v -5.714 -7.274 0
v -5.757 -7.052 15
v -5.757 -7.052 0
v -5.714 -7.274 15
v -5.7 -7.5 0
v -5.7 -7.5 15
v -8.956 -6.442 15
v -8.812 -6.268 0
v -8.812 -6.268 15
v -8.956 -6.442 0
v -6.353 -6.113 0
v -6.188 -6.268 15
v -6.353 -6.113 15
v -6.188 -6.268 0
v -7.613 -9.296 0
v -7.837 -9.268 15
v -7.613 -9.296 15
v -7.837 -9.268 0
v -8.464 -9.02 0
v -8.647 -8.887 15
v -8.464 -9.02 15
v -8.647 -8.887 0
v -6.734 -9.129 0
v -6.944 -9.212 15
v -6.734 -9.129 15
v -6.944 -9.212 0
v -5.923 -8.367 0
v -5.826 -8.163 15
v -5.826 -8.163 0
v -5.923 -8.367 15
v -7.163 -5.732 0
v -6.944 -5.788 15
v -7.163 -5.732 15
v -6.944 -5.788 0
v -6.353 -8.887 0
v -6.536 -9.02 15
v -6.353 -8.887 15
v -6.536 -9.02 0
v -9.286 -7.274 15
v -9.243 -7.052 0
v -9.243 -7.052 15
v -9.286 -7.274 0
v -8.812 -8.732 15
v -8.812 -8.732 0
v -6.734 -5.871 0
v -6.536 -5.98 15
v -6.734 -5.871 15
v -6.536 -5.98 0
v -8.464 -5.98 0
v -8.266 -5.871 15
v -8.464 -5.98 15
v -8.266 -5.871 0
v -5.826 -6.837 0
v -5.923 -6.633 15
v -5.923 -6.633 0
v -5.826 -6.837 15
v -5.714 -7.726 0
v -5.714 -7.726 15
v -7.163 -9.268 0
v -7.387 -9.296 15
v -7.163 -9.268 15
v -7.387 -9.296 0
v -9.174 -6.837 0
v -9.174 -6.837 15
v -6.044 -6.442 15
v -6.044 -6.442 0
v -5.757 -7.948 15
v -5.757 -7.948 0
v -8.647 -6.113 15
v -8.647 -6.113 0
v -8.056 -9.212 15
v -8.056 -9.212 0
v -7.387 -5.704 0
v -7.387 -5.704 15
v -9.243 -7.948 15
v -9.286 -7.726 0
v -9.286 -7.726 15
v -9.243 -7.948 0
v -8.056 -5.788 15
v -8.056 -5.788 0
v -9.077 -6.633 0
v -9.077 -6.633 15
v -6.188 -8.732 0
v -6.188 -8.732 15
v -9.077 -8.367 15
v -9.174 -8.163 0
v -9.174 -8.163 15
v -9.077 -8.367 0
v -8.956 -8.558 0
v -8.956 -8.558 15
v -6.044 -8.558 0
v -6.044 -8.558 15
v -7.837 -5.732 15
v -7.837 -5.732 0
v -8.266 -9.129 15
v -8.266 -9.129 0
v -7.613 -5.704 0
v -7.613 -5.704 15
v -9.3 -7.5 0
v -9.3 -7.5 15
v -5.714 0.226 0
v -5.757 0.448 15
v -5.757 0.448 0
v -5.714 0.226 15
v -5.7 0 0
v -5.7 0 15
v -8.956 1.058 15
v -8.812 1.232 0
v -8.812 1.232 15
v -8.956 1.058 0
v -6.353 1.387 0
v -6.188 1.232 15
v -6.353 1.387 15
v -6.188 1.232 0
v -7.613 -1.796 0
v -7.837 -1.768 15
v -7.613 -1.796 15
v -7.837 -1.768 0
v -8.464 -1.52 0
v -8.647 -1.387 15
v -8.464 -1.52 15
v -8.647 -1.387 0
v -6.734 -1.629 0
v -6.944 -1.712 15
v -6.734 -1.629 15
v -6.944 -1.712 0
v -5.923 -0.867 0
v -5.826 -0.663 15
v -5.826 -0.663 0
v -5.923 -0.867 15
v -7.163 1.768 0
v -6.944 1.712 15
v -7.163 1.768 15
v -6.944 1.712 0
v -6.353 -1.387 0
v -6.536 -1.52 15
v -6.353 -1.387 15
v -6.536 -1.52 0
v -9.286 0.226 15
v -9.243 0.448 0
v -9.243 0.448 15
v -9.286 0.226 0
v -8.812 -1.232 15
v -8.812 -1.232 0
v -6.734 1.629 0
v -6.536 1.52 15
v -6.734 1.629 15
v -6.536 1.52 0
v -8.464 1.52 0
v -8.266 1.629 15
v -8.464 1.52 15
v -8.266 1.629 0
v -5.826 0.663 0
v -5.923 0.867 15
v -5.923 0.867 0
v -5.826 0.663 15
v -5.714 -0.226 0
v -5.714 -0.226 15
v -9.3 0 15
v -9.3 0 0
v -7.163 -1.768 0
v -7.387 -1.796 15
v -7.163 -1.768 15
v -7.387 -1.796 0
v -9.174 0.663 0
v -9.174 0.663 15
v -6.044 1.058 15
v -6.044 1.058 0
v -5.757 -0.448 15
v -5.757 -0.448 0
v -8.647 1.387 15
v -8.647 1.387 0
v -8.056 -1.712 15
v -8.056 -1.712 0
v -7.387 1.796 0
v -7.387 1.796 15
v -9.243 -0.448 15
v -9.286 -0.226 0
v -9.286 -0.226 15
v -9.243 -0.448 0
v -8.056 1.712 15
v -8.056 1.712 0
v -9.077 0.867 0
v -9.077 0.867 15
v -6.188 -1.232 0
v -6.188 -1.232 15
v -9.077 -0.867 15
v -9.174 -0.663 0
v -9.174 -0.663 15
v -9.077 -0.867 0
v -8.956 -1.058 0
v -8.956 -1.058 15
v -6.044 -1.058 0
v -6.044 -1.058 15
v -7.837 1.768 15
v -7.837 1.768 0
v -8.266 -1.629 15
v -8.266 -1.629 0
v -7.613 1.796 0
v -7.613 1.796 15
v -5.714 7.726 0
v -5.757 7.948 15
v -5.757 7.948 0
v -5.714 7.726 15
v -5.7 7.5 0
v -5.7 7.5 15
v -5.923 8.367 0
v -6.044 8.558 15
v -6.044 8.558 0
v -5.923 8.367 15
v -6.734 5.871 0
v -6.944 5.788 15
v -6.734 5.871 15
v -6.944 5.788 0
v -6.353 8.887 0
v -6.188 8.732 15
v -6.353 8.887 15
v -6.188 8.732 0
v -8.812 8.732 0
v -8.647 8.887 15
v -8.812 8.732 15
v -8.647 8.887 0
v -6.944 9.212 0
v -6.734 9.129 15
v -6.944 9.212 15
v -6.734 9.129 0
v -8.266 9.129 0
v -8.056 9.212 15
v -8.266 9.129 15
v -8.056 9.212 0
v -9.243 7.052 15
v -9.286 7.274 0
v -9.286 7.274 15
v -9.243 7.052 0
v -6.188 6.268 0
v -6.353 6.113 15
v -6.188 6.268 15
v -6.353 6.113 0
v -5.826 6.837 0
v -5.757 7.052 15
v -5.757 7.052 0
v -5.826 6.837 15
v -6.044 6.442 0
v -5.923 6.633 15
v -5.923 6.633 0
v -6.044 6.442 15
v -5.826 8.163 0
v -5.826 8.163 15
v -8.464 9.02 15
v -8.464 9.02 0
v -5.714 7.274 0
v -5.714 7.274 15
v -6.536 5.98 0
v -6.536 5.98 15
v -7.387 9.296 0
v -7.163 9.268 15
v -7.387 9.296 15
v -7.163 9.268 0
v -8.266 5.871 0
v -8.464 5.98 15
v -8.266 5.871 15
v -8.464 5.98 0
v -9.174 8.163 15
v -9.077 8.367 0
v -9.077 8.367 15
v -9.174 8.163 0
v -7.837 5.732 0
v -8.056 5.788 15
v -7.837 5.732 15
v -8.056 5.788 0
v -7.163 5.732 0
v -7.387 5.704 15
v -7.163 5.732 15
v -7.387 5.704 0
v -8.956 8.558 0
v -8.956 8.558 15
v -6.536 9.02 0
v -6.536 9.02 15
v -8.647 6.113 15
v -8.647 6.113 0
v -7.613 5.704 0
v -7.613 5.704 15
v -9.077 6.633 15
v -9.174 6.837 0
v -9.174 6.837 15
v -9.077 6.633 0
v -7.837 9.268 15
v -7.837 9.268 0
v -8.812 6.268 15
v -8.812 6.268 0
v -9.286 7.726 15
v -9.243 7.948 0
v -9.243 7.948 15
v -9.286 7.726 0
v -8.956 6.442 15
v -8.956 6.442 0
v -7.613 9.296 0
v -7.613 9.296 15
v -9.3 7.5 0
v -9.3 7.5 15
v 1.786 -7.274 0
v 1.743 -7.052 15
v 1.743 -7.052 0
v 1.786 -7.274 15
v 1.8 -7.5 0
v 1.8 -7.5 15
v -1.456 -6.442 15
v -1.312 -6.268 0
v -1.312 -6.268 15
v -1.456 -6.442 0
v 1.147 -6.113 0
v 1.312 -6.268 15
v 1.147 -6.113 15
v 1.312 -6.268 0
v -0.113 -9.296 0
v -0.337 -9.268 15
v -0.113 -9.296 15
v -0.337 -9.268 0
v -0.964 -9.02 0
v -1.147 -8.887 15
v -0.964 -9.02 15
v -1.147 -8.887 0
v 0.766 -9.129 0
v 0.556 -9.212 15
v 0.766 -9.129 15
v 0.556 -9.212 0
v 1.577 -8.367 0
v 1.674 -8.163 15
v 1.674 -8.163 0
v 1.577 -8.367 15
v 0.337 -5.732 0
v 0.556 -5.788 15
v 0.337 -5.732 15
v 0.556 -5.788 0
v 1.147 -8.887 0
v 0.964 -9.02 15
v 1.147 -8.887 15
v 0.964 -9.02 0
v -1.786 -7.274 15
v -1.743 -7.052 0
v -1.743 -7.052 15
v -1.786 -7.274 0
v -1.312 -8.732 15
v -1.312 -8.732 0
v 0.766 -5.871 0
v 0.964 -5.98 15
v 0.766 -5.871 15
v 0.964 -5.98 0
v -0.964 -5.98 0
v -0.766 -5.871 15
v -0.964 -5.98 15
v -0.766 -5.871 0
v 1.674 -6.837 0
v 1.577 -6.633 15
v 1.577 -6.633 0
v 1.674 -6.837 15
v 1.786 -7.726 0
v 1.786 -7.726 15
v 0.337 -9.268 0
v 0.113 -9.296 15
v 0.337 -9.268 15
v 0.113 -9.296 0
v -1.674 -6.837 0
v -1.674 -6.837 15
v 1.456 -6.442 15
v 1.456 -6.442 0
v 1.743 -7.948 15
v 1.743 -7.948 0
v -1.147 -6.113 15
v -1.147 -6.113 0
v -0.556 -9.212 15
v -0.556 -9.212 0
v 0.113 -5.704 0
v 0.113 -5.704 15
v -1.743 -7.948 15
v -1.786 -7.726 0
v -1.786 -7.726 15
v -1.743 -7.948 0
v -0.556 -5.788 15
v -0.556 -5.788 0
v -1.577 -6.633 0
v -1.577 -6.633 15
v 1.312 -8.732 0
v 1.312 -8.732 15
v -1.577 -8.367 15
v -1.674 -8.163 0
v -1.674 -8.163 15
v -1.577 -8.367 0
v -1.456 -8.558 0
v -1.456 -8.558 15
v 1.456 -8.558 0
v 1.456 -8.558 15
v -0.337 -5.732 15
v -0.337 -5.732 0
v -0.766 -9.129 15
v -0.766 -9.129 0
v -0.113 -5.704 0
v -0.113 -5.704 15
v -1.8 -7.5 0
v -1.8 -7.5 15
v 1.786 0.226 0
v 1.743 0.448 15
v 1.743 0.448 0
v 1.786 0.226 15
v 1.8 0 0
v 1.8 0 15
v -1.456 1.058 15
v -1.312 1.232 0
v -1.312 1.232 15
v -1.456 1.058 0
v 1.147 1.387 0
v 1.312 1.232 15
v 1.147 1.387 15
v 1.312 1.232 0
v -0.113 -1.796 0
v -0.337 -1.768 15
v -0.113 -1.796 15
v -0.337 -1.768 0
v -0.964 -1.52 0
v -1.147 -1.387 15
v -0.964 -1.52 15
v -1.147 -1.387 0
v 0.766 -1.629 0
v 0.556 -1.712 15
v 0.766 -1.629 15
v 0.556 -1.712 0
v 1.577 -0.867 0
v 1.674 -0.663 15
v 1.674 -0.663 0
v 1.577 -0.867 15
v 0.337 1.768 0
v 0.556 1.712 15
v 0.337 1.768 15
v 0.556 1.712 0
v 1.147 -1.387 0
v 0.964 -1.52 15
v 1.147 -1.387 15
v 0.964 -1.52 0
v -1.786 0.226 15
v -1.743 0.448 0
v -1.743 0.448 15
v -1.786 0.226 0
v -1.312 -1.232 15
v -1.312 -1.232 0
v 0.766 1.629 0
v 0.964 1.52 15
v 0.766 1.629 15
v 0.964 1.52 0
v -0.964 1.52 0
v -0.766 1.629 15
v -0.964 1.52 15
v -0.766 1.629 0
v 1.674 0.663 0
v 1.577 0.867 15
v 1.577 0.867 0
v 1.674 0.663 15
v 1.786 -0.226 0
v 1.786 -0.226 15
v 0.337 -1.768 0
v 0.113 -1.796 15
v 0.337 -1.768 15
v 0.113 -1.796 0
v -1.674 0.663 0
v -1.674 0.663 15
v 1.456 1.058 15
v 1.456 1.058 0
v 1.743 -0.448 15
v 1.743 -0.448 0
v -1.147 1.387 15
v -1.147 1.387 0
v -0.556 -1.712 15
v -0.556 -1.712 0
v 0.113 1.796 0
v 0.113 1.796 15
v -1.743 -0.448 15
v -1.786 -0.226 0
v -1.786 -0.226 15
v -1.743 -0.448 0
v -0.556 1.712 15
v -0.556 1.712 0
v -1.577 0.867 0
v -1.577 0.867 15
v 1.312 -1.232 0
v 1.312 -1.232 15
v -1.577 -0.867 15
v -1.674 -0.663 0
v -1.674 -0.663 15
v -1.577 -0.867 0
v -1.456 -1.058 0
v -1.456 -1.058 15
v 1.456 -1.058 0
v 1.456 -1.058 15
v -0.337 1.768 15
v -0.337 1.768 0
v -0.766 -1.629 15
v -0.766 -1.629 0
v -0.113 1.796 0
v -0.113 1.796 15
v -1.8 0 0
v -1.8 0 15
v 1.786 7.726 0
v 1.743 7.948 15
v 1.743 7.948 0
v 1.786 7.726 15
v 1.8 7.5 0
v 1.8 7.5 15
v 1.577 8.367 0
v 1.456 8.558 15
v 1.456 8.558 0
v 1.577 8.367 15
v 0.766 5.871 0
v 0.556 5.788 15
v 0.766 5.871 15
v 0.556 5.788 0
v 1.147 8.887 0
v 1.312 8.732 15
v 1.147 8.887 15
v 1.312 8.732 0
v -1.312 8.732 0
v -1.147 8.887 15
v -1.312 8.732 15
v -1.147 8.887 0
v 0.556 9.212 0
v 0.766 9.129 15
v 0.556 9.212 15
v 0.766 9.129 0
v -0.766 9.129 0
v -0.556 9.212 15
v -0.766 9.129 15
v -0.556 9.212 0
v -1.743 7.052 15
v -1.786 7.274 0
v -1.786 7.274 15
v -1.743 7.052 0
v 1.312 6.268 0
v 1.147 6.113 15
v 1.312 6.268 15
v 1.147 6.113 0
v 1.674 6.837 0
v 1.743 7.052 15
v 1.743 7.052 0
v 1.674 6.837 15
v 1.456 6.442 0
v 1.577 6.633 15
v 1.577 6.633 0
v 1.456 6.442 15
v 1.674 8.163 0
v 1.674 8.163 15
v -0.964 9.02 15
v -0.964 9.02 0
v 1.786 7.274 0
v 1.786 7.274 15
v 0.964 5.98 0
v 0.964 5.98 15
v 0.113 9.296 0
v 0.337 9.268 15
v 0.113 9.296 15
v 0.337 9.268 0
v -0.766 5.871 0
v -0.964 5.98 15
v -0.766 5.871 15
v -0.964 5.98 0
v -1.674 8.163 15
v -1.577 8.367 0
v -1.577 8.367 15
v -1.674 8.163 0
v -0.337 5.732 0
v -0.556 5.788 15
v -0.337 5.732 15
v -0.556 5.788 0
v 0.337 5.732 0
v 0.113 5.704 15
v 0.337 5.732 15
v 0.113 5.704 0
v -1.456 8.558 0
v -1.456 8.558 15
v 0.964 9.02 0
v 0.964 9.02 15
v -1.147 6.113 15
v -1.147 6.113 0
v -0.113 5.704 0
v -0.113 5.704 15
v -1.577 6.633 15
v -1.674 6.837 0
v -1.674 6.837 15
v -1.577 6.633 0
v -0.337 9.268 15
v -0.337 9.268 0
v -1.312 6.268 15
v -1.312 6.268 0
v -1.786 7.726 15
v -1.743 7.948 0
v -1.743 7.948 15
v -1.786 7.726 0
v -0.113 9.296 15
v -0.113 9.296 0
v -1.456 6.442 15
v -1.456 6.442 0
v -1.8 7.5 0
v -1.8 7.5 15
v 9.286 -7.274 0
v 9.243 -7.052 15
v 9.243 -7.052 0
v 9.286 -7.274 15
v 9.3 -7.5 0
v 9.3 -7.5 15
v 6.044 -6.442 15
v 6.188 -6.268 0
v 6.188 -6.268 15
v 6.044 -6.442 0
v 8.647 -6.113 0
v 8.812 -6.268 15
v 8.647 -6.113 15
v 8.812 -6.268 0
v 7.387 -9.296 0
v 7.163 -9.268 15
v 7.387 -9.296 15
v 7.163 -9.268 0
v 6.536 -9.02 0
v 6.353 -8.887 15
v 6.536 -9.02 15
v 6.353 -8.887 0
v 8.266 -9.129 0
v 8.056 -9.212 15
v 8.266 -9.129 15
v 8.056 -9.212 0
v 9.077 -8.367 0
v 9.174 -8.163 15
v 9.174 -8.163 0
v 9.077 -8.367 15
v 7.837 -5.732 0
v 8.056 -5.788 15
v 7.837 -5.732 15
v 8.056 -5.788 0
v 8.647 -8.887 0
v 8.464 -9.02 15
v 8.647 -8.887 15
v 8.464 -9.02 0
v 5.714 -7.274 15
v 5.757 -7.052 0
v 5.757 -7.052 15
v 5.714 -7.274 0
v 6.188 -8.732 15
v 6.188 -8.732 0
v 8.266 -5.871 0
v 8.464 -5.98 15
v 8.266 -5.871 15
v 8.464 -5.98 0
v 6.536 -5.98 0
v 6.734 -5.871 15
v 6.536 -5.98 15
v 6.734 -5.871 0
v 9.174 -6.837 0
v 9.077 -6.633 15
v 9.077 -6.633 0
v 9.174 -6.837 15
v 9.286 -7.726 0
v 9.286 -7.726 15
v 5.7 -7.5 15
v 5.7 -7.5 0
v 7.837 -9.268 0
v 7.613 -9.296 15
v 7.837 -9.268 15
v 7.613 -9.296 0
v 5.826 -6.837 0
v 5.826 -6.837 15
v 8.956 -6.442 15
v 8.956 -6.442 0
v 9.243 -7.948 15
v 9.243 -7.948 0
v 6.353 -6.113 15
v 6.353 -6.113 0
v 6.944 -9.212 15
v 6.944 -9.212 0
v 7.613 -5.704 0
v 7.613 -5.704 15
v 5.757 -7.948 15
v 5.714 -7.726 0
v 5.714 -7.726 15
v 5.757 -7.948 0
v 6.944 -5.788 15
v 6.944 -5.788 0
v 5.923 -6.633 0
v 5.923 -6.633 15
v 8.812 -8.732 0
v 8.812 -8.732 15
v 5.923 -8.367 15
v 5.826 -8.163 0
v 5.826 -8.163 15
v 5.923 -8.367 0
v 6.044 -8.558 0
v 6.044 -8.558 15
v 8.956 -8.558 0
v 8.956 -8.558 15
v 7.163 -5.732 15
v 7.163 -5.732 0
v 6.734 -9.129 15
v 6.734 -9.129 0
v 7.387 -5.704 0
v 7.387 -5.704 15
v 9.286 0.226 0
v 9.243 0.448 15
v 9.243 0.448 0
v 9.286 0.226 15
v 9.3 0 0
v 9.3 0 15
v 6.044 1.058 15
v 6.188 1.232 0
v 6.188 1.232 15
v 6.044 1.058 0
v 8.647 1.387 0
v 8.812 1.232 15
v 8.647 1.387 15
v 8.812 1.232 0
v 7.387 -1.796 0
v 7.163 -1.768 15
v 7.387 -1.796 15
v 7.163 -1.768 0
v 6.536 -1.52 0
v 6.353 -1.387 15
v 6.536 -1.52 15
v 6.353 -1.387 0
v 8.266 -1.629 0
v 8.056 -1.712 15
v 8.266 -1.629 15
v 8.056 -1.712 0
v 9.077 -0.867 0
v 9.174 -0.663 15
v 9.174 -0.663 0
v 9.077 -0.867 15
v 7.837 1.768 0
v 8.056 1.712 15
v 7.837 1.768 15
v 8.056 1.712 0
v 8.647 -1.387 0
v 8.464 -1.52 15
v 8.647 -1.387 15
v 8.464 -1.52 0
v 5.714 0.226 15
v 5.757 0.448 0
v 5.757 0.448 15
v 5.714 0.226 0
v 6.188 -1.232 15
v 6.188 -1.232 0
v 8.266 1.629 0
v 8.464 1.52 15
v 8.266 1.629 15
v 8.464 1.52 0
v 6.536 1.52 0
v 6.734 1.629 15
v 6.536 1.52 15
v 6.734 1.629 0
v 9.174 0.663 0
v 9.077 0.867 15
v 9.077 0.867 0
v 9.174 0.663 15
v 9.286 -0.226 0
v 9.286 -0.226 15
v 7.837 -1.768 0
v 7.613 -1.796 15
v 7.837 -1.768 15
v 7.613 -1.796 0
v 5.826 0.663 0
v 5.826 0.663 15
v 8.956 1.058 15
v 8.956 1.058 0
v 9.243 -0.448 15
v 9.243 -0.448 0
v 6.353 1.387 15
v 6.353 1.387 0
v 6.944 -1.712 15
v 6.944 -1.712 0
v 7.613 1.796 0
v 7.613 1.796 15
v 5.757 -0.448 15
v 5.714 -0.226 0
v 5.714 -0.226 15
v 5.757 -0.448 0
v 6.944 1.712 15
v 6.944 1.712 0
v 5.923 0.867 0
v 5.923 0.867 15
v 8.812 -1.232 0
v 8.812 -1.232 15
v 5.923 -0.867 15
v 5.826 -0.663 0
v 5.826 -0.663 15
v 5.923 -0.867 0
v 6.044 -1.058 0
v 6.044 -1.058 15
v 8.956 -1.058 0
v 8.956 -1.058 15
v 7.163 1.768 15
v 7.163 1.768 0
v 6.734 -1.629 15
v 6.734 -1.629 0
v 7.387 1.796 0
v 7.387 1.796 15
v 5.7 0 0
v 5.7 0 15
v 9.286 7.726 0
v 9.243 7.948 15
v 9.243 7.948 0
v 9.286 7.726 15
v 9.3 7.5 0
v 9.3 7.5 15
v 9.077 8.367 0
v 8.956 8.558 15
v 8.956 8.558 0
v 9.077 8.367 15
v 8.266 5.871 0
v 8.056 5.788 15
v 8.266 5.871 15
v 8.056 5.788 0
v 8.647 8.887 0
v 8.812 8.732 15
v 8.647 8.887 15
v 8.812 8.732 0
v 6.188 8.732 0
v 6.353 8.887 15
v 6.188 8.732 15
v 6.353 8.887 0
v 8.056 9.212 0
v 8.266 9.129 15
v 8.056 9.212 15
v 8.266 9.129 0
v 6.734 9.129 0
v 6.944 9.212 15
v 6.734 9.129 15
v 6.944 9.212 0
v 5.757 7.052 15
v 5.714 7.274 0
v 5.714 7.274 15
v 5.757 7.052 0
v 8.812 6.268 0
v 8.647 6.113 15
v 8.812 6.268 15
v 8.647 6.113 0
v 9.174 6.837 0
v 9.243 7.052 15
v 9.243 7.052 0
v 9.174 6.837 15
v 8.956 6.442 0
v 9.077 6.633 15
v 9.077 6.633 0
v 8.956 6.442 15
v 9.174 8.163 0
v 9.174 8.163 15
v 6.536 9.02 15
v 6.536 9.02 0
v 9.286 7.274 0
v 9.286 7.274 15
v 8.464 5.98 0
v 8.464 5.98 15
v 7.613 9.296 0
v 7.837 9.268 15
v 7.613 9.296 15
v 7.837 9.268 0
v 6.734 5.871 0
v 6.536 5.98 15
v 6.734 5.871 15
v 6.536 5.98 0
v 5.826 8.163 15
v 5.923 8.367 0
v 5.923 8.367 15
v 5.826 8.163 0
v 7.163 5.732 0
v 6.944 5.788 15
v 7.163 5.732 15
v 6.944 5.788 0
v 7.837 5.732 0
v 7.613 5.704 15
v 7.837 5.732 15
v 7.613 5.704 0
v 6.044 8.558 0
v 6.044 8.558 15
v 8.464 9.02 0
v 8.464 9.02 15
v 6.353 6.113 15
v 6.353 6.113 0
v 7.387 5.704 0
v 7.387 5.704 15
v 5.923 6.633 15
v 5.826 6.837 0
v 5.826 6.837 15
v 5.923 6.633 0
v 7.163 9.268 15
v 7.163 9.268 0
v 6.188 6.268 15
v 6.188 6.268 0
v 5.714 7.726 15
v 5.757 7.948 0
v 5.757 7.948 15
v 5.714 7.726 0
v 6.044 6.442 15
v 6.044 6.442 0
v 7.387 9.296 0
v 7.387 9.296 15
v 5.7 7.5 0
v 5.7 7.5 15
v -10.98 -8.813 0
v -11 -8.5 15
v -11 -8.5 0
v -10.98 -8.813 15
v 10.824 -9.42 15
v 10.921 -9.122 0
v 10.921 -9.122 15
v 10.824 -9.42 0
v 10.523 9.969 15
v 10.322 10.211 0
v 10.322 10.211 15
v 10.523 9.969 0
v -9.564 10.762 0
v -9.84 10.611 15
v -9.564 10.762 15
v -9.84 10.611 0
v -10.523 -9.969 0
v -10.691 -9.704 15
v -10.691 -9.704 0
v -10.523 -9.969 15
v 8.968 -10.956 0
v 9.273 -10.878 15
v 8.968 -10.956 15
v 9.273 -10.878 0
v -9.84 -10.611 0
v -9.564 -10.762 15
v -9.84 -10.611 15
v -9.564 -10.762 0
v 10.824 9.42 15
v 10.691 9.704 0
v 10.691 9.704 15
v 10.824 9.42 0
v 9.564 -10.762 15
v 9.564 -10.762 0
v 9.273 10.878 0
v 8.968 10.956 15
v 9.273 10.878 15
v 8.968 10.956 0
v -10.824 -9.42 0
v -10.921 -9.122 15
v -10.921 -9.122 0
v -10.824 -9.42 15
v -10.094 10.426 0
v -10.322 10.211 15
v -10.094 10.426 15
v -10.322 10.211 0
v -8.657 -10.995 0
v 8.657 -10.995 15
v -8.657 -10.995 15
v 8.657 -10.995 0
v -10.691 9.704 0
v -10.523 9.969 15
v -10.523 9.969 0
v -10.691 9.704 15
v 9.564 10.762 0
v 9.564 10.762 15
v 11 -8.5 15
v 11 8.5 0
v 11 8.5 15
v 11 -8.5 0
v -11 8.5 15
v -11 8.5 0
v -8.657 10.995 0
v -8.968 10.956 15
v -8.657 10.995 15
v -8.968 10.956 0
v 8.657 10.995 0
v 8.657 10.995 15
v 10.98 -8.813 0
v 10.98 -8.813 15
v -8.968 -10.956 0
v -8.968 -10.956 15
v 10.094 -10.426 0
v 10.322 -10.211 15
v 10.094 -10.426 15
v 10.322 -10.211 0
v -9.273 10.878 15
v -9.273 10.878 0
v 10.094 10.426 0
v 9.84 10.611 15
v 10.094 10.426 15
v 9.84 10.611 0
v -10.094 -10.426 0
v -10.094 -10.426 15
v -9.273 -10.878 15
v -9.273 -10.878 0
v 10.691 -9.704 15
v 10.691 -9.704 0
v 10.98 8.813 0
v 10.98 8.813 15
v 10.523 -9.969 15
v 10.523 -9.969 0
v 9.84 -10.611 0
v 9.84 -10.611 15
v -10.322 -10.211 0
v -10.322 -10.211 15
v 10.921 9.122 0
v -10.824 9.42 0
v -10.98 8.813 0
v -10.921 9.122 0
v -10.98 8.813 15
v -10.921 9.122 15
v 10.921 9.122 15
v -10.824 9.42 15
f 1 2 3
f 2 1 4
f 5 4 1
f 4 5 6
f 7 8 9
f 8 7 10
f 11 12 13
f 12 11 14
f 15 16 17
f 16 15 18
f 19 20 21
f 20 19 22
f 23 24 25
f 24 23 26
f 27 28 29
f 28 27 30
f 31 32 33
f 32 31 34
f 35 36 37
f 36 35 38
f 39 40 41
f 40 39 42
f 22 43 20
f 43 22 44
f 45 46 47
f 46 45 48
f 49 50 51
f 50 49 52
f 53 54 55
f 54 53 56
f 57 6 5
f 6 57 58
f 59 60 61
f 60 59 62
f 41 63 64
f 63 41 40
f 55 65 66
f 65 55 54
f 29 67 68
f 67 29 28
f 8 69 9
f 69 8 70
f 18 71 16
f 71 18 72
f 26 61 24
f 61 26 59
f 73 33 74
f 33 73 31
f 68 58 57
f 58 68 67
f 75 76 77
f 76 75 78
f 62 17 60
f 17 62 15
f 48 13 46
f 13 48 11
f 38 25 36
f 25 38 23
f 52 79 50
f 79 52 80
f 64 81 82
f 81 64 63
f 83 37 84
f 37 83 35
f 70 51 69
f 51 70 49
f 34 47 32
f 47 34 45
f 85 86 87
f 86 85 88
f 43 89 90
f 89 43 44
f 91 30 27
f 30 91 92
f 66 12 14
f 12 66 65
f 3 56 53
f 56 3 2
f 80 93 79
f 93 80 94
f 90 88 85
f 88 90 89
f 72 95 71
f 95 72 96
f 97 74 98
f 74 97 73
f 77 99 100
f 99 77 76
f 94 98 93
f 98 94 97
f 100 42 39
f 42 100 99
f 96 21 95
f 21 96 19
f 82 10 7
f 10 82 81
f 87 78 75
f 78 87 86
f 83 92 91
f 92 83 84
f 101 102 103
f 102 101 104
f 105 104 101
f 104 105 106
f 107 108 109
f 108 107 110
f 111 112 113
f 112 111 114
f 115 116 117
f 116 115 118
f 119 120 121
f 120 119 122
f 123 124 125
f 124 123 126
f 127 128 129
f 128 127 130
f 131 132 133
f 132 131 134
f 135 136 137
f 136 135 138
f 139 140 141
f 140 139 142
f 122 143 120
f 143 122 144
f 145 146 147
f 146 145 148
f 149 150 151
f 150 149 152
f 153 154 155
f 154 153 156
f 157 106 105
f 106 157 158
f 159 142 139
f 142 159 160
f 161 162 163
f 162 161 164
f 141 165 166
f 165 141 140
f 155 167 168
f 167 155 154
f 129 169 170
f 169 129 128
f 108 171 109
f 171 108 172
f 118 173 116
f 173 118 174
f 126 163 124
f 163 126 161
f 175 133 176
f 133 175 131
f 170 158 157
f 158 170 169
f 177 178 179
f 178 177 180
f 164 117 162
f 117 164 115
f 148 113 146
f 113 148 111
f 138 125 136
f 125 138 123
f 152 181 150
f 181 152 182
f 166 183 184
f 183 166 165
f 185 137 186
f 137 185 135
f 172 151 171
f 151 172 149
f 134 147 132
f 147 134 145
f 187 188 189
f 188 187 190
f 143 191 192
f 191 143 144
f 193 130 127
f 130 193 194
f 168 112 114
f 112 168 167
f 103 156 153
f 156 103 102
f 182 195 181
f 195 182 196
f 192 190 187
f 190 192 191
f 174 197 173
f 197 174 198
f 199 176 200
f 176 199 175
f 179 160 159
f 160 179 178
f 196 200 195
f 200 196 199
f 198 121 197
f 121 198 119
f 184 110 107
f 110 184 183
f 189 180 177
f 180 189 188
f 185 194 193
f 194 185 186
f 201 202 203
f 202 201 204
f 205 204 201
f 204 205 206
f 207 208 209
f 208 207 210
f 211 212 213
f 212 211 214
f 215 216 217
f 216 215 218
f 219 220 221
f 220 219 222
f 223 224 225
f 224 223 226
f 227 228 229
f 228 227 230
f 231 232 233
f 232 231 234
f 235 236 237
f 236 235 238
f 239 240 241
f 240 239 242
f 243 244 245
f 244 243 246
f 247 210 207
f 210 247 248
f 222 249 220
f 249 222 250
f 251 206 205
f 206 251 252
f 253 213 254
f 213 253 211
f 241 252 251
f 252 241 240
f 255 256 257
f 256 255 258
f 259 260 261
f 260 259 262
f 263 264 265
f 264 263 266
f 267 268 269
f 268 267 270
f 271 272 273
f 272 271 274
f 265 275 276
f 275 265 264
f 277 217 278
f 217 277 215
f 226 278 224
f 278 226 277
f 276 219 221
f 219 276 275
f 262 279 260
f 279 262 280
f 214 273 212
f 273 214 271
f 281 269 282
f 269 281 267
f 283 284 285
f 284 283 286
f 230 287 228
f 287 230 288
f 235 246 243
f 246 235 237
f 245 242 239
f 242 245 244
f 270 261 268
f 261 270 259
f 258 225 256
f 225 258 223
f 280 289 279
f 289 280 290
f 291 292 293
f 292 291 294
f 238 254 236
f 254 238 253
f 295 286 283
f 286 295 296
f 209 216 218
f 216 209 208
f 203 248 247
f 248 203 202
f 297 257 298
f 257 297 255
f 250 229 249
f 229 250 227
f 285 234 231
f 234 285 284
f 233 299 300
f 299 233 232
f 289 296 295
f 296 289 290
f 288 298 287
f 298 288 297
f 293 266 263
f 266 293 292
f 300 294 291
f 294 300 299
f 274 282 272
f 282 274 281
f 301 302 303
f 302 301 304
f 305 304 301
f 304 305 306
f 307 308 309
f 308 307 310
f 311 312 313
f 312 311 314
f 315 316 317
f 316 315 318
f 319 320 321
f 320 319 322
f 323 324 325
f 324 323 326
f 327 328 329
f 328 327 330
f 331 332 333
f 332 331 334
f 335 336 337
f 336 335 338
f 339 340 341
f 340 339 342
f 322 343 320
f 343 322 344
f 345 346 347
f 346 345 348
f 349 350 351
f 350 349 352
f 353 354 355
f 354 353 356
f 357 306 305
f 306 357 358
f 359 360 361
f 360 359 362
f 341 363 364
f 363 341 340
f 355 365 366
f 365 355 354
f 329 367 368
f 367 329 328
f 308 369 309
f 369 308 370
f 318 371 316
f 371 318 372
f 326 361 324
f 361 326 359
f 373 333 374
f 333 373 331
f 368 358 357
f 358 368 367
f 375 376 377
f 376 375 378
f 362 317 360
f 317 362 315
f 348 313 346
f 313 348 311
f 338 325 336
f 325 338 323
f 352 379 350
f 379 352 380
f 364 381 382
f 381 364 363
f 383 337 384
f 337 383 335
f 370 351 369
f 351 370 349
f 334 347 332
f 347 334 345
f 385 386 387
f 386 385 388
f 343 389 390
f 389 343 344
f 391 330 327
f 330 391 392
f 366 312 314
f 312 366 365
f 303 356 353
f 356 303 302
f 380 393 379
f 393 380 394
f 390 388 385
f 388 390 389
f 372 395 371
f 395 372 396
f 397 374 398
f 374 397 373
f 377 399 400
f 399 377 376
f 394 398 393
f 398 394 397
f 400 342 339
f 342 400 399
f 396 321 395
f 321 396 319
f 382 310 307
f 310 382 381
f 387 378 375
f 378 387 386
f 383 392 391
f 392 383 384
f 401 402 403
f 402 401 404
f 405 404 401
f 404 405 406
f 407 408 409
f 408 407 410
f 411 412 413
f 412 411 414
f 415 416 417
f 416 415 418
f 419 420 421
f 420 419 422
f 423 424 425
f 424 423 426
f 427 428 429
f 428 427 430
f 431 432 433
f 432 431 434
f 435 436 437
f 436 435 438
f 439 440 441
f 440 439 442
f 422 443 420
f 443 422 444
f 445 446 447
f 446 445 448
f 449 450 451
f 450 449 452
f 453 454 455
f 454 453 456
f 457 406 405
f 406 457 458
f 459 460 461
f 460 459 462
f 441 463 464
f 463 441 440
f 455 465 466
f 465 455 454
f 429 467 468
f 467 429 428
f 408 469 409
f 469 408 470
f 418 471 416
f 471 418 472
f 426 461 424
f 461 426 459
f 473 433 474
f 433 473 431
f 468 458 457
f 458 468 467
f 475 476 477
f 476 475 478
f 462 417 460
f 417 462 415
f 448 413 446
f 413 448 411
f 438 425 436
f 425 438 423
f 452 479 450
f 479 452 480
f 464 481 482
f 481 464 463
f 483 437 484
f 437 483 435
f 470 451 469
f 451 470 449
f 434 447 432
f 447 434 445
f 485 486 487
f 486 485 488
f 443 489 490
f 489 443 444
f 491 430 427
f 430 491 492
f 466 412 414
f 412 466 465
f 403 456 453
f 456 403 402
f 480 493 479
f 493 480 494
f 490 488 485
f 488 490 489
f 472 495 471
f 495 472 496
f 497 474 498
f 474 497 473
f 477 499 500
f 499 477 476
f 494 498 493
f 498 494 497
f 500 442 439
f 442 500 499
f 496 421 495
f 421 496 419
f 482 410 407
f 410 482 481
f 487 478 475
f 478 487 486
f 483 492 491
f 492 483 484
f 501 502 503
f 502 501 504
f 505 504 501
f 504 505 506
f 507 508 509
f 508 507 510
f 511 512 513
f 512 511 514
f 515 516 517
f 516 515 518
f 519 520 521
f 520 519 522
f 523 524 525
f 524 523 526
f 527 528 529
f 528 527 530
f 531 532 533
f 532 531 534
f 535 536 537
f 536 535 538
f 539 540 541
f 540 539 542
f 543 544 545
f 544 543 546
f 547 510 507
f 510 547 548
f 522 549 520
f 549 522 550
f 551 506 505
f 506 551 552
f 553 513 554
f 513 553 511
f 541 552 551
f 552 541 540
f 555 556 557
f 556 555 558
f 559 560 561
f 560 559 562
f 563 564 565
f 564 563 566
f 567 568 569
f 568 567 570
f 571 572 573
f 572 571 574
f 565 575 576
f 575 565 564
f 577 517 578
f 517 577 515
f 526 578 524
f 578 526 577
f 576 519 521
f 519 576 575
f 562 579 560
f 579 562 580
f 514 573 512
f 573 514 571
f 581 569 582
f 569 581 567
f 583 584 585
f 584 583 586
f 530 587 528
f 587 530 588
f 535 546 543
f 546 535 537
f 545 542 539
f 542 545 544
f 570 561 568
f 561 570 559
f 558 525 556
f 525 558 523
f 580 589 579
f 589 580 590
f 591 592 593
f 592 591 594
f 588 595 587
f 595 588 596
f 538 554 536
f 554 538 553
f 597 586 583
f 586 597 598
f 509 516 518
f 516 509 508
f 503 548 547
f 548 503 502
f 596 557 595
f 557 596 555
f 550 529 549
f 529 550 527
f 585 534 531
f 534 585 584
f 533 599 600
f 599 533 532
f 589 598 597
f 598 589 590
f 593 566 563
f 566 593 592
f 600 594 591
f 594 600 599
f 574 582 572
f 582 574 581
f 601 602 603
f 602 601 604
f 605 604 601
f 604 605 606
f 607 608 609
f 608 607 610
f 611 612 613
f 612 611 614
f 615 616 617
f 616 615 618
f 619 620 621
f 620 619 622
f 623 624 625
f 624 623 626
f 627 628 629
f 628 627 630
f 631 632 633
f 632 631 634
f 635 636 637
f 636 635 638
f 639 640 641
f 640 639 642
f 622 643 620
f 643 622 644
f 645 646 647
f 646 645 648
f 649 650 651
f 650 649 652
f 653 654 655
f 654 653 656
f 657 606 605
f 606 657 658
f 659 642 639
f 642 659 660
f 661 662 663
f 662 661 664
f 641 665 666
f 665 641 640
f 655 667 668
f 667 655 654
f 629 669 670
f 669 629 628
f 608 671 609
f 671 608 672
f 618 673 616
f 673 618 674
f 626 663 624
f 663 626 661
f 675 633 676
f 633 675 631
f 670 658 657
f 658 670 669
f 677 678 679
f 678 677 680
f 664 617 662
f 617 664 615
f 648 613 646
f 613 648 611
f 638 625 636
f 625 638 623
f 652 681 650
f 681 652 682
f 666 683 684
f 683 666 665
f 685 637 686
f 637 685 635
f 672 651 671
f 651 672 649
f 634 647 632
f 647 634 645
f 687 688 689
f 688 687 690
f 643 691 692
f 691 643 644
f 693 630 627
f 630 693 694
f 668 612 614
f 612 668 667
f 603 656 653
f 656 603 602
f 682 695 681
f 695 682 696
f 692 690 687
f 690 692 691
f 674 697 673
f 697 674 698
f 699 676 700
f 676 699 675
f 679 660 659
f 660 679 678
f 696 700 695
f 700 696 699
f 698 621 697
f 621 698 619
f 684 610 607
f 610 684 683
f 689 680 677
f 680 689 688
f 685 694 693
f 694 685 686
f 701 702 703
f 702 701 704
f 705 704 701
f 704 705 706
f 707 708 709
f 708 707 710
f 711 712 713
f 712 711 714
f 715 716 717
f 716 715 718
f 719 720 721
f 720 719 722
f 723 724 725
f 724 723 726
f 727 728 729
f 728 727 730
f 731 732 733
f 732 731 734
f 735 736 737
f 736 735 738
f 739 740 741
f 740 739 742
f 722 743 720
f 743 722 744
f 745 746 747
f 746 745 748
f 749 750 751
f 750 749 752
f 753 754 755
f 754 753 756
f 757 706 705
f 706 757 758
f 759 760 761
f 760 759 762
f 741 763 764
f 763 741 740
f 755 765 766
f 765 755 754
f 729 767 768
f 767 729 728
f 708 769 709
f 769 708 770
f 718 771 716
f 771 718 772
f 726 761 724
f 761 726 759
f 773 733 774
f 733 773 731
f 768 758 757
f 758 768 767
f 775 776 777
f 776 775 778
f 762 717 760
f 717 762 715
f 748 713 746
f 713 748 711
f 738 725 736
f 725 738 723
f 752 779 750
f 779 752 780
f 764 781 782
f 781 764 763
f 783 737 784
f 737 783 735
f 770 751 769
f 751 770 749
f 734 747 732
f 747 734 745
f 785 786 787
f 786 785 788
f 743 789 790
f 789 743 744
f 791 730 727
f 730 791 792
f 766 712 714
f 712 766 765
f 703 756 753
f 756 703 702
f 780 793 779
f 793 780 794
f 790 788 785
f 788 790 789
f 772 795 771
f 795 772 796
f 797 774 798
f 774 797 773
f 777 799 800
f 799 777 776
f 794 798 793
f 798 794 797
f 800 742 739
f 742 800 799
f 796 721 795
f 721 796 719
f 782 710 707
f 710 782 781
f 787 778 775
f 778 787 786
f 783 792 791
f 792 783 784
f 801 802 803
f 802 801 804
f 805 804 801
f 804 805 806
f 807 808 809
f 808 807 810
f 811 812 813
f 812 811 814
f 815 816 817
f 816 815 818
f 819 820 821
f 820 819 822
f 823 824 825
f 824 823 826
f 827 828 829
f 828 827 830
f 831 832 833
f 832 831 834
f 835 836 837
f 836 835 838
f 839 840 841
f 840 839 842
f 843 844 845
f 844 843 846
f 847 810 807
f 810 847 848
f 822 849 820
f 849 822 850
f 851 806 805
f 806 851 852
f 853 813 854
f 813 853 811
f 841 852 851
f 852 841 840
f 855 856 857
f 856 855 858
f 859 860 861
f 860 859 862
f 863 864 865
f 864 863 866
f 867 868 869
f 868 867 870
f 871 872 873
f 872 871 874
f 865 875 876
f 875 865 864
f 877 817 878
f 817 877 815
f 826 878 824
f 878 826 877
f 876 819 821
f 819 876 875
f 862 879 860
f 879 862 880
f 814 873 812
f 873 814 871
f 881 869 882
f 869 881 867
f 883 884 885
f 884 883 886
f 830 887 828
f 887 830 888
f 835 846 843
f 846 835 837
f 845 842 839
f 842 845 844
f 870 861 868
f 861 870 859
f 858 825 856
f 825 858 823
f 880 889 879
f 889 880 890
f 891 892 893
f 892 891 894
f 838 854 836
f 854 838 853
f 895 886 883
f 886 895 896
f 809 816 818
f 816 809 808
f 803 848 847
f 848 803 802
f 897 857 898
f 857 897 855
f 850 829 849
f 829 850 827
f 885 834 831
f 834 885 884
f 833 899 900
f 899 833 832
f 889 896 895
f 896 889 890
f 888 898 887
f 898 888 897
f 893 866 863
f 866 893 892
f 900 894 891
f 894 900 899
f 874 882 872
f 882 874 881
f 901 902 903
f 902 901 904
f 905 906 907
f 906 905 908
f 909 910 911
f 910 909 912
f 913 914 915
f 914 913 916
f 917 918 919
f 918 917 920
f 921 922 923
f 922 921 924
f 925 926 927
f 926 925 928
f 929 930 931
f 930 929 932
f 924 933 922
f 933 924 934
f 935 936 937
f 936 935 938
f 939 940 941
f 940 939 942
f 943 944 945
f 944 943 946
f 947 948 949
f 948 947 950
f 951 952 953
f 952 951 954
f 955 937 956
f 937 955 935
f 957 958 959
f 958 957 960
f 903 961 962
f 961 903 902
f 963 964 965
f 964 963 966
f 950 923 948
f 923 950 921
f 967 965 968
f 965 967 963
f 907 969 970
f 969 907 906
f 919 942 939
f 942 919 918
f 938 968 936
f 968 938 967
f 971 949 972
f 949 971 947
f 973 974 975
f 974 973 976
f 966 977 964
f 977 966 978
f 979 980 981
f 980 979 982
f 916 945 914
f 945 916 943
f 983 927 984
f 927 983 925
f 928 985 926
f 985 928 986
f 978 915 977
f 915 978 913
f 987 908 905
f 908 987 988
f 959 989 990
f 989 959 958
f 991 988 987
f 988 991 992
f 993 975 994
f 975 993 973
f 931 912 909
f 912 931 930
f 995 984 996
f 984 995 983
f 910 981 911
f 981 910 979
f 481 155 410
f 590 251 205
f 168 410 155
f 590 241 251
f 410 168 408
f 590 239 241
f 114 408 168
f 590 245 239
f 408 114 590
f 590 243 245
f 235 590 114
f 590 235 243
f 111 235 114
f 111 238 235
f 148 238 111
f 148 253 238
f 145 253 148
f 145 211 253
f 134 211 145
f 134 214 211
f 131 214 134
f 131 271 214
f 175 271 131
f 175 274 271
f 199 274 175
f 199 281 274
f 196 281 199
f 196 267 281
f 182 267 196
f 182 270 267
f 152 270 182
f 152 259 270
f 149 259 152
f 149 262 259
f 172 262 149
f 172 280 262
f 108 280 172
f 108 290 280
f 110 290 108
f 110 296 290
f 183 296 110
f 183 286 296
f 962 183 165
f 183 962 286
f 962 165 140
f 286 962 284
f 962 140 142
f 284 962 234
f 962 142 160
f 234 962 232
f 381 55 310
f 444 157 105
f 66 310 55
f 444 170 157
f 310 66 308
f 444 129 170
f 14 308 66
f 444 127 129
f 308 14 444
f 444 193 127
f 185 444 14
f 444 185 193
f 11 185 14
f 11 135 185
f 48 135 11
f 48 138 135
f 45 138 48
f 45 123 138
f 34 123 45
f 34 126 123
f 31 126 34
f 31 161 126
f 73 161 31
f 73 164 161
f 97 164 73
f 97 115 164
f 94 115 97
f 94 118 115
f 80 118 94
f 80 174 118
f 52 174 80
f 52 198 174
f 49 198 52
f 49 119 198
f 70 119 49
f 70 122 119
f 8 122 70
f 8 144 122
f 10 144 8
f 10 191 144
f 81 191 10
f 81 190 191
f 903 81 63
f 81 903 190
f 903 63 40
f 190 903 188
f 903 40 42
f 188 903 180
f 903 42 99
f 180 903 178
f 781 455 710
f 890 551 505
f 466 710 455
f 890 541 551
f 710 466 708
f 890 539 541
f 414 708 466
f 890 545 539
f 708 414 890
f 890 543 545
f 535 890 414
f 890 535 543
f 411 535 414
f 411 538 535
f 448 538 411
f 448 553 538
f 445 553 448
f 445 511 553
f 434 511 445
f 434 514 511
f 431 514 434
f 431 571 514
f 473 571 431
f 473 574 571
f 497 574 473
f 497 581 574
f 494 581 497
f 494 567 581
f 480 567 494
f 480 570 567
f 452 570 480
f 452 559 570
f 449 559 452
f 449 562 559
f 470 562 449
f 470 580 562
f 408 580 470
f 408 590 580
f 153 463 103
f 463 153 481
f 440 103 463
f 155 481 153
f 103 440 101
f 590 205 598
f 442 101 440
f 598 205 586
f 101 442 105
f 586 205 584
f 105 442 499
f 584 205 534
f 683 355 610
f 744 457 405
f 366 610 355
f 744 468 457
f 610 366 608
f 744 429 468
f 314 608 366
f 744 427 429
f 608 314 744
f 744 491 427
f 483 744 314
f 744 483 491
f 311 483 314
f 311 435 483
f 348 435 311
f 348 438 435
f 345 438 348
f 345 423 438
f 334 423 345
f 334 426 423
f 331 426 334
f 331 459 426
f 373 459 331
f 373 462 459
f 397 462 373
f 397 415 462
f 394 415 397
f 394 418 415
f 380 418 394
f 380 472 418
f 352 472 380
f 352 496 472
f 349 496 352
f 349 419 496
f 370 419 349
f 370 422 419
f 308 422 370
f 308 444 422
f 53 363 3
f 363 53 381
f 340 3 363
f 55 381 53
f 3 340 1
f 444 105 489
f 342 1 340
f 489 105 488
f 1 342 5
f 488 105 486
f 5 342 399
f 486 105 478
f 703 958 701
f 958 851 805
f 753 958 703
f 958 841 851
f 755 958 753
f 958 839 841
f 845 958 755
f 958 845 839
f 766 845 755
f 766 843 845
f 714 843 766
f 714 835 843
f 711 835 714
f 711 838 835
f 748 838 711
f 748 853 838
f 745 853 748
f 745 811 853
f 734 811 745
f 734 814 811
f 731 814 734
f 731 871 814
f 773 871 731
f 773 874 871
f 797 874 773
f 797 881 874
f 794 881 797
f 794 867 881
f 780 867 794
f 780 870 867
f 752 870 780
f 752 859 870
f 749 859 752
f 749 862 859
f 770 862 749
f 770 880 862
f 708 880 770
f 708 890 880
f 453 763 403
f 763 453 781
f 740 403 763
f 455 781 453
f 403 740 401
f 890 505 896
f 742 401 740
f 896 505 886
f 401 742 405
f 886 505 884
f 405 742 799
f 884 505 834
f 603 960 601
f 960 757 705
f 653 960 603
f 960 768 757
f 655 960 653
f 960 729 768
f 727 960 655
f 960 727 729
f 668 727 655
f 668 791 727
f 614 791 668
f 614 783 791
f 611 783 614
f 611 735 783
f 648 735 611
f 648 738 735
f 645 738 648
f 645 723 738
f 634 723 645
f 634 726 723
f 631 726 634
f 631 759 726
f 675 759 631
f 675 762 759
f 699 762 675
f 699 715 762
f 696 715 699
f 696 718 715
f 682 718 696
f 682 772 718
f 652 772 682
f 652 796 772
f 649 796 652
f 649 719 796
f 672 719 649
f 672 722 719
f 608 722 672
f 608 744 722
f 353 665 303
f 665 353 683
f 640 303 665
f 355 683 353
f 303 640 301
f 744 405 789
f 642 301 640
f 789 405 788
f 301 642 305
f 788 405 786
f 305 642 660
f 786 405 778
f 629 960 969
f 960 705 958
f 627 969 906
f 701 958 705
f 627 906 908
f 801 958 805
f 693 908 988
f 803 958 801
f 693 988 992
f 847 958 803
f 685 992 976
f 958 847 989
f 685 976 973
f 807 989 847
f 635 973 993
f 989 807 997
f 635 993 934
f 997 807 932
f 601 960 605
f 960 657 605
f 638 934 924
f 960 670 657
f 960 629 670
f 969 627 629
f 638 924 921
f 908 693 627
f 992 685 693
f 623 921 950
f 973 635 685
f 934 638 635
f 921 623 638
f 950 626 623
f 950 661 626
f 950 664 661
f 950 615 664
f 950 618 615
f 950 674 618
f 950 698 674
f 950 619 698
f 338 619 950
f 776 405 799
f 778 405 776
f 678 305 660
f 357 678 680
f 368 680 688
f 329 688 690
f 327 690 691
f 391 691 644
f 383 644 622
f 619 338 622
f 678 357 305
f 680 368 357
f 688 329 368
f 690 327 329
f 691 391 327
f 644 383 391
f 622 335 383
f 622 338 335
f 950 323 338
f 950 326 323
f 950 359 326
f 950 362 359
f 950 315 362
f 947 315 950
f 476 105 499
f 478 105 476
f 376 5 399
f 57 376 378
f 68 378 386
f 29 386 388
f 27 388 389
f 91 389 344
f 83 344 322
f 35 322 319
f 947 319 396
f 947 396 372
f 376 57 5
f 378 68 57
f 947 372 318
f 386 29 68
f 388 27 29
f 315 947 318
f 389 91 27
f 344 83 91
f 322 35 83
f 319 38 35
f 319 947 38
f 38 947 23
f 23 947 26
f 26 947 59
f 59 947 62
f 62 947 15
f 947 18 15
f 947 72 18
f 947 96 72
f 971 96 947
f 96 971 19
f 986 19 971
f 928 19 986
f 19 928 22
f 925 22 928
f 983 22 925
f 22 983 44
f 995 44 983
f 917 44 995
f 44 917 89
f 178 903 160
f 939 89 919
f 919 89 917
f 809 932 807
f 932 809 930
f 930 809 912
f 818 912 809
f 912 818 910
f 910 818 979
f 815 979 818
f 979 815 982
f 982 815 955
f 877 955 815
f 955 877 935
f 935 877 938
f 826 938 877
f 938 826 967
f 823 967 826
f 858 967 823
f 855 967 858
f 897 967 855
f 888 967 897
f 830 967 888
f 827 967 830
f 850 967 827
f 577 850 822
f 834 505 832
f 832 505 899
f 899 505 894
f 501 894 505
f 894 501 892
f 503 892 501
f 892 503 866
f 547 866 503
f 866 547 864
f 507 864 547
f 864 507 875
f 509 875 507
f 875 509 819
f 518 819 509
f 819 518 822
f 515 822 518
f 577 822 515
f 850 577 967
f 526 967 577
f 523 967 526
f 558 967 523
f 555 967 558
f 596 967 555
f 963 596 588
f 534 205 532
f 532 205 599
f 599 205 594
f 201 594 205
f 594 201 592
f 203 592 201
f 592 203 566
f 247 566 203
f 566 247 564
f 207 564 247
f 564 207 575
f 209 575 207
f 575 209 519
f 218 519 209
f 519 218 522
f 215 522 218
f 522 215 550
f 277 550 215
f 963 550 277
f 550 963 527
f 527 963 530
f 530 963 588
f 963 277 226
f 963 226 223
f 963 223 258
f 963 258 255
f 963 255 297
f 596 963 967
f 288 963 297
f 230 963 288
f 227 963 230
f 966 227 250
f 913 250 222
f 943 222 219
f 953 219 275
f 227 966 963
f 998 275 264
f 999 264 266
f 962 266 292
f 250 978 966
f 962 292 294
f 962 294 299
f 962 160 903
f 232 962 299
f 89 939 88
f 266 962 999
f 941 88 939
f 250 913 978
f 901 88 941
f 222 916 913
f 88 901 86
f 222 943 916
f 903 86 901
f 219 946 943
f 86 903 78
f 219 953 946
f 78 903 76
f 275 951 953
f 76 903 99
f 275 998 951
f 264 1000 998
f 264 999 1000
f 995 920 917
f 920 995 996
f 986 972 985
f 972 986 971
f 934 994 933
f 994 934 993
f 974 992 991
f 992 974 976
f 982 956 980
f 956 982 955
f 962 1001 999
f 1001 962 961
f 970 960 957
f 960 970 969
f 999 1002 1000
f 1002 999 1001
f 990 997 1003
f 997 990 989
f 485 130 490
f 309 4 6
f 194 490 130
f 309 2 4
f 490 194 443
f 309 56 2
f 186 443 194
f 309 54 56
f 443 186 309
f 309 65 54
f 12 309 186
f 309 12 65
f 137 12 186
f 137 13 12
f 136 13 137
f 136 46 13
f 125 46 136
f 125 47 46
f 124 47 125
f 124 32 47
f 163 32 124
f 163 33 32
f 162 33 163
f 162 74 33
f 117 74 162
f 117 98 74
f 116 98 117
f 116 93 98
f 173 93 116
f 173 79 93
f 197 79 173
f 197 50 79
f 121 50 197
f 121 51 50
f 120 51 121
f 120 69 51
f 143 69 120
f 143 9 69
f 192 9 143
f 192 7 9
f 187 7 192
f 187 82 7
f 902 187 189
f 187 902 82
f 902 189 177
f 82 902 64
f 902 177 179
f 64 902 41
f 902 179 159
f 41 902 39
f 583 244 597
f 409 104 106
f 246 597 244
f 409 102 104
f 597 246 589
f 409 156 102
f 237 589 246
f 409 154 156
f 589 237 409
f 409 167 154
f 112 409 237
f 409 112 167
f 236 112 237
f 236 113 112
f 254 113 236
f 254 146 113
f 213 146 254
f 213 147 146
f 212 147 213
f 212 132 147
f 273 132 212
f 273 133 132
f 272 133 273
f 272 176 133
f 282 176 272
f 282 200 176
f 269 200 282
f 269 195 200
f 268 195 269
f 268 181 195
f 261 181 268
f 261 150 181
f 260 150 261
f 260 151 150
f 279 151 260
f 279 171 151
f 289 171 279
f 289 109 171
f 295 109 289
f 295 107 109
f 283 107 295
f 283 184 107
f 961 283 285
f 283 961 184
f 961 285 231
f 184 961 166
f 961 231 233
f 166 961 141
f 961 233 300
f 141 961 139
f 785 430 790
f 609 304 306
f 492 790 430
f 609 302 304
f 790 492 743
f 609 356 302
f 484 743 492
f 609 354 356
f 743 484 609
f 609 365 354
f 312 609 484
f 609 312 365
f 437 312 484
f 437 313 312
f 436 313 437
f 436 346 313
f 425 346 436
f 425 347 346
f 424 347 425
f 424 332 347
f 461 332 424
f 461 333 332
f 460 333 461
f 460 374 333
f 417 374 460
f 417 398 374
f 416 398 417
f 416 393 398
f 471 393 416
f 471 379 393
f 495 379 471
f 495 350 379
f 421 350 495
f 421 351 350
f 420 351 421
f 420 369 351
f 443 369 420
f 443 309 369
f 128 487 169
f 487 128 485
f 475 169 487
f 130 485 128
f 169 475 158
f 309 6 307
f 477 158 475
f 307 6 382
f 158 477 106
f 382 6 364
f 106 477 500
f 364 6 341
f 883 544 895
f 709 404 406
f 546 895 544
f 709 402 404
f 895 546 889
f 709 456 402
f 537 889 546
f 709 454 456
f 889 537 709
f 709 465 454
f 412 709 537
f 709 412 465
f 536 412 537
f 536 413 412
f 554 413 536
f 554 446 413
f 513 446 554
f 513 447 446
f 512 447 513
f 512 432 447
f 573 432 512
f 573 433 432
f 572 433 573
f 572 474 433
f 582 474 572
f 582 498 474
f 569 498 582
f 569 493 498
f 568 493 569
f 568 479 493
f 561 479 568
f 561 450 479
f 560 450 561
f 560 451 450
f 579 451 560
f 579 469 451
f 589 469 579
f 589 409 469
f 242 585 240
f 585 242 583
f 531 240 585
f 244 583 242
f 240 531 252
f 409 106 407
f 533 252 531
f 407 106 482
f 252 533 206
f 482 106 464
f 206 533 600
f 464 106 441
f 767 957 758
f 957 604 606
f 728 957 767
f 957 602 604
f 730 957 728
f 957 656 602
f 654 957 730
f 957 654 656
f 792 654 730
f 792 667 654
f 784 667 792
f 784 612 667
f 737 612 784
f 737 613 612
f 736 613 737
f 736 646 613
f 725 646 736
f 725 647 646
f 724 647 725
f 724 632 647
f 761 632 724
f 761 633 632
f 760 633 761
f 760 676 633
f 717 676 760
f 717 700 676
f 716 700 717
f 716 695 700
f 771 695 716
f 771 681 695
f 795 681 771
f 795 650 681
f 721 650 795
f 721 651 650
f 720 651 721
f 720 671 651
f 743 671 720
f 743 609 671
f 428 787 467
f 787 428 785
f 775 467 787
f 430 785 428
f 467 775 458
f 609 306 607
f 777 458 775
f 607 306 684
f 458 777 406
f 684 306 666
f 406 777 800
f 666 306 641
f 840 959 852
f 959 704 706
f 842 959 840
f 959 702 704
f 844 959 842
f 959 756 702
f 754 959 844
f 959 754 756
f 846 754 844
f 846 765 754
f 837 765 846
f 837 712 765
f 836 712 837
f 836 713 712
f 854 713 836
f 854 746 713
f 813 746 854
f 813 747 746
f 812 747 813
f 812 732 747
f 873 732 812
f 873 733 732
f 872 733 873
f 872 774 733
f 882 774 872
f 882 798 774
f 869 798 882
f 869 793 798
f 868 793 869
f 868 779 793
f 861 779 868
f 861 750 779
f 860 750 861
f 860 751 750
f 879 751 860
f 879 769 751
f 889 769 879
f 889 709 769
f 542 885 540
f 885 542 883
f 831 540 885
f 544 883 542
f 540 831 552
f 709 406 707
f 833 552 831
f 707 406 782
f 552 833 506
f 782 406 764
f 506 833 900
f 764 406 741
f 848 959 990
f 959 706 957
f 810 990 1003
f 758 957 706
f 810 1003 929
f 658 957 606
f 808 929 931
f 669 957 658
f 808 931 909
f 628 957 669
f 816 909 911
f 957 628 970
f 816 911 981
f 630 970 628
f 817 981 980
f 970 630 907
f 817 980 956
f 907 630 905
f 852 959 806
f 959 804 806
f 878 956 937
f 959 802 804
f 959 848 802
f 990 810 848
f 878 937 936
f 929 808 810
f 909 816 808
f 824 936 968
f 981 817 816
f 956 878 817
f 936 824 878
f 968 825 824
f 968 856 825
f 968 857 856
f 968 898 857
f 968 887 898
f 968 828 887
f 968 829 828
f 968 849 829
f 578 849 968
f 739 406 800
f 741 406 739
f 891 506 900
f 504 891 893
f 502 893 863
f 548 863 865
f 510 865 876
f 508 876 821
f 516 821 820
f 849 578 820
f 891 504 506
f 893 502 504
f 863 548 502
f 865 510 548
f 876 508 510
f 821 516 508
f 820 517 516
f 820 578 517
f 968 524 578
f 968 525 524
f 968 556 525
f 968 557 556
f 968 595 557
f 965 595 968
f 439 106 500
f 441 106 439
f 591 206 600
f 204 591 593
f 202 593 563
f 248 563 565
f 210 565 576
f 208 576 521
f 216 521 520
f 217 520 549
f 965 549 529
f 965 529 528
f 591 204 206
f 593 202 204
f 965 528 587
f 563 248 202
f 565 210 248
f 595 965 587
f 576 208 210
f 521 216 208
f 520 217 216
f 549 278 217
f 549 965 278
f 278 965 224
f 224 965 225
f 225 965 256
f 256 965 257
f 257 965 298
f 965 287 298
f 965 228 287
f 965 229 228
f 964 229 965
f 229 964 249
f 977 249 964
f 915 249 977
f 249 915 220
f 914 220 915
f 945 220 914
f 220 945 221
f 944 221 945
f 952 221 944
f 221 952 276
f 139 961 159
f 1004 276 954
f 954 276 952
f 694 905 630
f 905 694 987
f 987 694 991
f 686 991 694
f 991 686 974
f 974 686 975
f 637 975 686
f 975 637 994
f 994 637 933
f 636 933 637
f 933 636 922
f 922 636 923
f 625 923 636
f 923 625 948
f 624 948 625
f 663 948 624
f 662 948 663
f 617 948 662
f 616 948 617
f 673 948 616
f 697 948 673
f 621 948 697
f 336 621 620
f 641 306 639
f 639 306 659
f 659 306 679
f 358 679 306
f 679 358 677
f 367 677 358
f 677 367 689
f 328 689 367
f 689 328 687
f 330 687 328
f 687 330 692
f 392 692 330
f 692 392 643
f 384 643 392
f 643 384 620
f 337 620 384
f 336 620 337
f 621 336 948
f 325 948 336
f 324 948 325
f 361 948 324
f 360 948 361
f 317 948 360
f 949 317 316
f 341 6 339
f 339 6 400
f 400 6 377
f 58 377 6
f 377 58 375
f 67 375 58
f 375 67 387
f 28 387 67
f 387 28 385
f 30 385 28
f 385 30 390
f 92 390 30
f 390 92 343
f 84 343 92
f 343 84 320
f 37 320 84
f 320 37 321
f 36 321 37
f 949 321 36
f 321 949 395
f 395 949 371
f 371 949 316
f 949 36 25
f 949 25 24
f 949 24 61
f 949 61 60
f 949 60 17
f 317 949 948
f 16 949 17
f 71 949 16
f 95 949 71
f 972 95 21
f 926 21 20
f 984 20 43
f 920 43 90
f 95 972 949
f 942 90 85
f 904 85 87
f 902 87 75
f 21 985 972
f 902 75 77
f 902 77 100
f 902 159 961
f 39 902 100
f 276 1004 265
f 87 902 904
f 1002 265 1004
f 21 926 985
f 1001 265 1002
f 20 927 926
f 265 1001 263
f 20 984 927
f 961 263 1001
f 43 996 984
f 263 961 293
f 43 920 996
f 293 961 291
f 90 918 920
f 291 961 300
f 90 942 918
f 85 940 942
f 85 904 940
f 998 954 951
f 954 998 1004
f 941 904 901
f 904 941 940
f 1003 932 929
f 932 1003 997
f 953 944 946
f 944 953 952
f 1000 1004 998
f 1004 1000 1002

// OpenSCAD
$fn = 50;


difference() {
	union() {
		translate(v = [0, 0, 0]) {
			rotate(a = [0, 0, 0]) {
				hull() {
					translate(v = [-8.5000000000, 8.5000000000, 0]) {
						rotate(a = [0, 0, 0]) {
							translate(v = [0, 0, 0]) {
								rotate(a = [0, 0, 0]) {
									cylinder(h = 15, r = 2.5000000000);
								}
							}
						}
					}
					translate(v = [8.5000000000, 8.5000000000, 0]) {
						rotate(a = [0, 0, 0]) {
							translate(v = [0, 0, 0]) {
								rotate(a = [0, 0, 0]) {
									cylinder(h = 15, r = 2.5000000000);
								}
							}
						}
					}
					translate(v = [-8.5000000000, -8.5000000000, 0]) {
						rotate(a = [0, 0, 0]) {
							translate(v = [0, 0, 0]) {
								rotate(a = [0, 0, 0]) {
									cylinder(h = 15, r = 2.5000000000);
								}
							}
						}
					}
					translate(v = [8.5000000000, -8.5000000000, 0]) {
						rotate(a = [0, 0, 0]) {
							translate(v = [0, 0, 0]) {
								rotate(a = [0, 0, 0]) {
									cylinder(h = 15, r = 2.5000000000);
								}
							}
						}
					}
				}
			}
		}
	}
	union() {
		translate(v = [-7.5000000000, -7.5000000000, 0]) {
			rotate(a = [0, 0, 0]) {
				translate(v = [0, 0, -50]) {
					rotate(a = [0, 0, 0]) {
						cylinder(h = 100, r = 1.8000000000);
					}
				}
			}
		}
		translate(v = [-7.5000000000, 0.0000000000, 0]) {
			rotate(a = [0, 0, 0]) {
				translate(v = [0, 0, -50]) {
					rotate(a = [0, 0, 0]) {
						cylinder(h = 100, r = 1.8000000000);
					}
				}
			}
		}
		translate(v = [-7.5000000000, 7.5000000000, 0]) {
			rotate(a = [0, 0, 0]) {
				translate(v = [0, 0, -50]) {
					rotate(a = [0, 0, 0]) {
						cylinder(h = 100, r = 1.8000000000);
					}
				}
			}
		}
		translate(v = [0.0000000000, -7.5000000000, 0]) {
			rotate(a = [0, 0, 0]) {
				translate(v = [0, 0, -50]) {
					rotate(a = [0, 0, 0]) {
						cylinder(h = 100, r = 1.8000000000);
					}
				}
			}
		}
		translate(v = [0.0000000000, 0.0000000000, 0]) {
			rotate(a = [0, 0, 0]) {
				translate(v = [0, 0, -50]) {
					rotate(a = [0, 0, 0]) {
						cylinder(h = 100, r = 1.8000000000);
					}
				}
			}
		}
		translate(v = [0.0000000000, 7.5000000000, 0]) {
			rotate(a = [0, 0, 0]) {
				translate(v = [0, 0, -50]) {
					rotate(a = [0, 0, 0]) {
						cylinder(h = 100, r = 1.8000000000);
					}
				}
			}
		}
		translate(v = [7.5000000000, -7.5000000000, 0]) {
			rotate(a = [0, 0, 0]) {
				translate(v = [0, 0, -50]) {
					rotate(a = [0, 0, 0]) {
						cylinder(h = 100, r = 1.8000000000);
					}
				}
			}
		}
		translate(v = [7.5000000000, 0.0000000000, 0]) {
			rotate(a = [0, 0, 0]) {
				translate(v = [0, 0, -50]) {
					rotate(a = [0, 0, 0]) {
						cylinder(h = 100, r = 1.8000000000);
					}
				}
			}
		}
		translate(v = [7.5000000000, 7.5000000000, 0]) {
			rotate(a = [0, 0, 0]) {
				translate(v = [0, 0, -50]) {
					rotate(a = [0, 0, 0]) {
						cylinder(h = 100, r = 1.8000000000);
					}
				}
			}
		}
	}
}
